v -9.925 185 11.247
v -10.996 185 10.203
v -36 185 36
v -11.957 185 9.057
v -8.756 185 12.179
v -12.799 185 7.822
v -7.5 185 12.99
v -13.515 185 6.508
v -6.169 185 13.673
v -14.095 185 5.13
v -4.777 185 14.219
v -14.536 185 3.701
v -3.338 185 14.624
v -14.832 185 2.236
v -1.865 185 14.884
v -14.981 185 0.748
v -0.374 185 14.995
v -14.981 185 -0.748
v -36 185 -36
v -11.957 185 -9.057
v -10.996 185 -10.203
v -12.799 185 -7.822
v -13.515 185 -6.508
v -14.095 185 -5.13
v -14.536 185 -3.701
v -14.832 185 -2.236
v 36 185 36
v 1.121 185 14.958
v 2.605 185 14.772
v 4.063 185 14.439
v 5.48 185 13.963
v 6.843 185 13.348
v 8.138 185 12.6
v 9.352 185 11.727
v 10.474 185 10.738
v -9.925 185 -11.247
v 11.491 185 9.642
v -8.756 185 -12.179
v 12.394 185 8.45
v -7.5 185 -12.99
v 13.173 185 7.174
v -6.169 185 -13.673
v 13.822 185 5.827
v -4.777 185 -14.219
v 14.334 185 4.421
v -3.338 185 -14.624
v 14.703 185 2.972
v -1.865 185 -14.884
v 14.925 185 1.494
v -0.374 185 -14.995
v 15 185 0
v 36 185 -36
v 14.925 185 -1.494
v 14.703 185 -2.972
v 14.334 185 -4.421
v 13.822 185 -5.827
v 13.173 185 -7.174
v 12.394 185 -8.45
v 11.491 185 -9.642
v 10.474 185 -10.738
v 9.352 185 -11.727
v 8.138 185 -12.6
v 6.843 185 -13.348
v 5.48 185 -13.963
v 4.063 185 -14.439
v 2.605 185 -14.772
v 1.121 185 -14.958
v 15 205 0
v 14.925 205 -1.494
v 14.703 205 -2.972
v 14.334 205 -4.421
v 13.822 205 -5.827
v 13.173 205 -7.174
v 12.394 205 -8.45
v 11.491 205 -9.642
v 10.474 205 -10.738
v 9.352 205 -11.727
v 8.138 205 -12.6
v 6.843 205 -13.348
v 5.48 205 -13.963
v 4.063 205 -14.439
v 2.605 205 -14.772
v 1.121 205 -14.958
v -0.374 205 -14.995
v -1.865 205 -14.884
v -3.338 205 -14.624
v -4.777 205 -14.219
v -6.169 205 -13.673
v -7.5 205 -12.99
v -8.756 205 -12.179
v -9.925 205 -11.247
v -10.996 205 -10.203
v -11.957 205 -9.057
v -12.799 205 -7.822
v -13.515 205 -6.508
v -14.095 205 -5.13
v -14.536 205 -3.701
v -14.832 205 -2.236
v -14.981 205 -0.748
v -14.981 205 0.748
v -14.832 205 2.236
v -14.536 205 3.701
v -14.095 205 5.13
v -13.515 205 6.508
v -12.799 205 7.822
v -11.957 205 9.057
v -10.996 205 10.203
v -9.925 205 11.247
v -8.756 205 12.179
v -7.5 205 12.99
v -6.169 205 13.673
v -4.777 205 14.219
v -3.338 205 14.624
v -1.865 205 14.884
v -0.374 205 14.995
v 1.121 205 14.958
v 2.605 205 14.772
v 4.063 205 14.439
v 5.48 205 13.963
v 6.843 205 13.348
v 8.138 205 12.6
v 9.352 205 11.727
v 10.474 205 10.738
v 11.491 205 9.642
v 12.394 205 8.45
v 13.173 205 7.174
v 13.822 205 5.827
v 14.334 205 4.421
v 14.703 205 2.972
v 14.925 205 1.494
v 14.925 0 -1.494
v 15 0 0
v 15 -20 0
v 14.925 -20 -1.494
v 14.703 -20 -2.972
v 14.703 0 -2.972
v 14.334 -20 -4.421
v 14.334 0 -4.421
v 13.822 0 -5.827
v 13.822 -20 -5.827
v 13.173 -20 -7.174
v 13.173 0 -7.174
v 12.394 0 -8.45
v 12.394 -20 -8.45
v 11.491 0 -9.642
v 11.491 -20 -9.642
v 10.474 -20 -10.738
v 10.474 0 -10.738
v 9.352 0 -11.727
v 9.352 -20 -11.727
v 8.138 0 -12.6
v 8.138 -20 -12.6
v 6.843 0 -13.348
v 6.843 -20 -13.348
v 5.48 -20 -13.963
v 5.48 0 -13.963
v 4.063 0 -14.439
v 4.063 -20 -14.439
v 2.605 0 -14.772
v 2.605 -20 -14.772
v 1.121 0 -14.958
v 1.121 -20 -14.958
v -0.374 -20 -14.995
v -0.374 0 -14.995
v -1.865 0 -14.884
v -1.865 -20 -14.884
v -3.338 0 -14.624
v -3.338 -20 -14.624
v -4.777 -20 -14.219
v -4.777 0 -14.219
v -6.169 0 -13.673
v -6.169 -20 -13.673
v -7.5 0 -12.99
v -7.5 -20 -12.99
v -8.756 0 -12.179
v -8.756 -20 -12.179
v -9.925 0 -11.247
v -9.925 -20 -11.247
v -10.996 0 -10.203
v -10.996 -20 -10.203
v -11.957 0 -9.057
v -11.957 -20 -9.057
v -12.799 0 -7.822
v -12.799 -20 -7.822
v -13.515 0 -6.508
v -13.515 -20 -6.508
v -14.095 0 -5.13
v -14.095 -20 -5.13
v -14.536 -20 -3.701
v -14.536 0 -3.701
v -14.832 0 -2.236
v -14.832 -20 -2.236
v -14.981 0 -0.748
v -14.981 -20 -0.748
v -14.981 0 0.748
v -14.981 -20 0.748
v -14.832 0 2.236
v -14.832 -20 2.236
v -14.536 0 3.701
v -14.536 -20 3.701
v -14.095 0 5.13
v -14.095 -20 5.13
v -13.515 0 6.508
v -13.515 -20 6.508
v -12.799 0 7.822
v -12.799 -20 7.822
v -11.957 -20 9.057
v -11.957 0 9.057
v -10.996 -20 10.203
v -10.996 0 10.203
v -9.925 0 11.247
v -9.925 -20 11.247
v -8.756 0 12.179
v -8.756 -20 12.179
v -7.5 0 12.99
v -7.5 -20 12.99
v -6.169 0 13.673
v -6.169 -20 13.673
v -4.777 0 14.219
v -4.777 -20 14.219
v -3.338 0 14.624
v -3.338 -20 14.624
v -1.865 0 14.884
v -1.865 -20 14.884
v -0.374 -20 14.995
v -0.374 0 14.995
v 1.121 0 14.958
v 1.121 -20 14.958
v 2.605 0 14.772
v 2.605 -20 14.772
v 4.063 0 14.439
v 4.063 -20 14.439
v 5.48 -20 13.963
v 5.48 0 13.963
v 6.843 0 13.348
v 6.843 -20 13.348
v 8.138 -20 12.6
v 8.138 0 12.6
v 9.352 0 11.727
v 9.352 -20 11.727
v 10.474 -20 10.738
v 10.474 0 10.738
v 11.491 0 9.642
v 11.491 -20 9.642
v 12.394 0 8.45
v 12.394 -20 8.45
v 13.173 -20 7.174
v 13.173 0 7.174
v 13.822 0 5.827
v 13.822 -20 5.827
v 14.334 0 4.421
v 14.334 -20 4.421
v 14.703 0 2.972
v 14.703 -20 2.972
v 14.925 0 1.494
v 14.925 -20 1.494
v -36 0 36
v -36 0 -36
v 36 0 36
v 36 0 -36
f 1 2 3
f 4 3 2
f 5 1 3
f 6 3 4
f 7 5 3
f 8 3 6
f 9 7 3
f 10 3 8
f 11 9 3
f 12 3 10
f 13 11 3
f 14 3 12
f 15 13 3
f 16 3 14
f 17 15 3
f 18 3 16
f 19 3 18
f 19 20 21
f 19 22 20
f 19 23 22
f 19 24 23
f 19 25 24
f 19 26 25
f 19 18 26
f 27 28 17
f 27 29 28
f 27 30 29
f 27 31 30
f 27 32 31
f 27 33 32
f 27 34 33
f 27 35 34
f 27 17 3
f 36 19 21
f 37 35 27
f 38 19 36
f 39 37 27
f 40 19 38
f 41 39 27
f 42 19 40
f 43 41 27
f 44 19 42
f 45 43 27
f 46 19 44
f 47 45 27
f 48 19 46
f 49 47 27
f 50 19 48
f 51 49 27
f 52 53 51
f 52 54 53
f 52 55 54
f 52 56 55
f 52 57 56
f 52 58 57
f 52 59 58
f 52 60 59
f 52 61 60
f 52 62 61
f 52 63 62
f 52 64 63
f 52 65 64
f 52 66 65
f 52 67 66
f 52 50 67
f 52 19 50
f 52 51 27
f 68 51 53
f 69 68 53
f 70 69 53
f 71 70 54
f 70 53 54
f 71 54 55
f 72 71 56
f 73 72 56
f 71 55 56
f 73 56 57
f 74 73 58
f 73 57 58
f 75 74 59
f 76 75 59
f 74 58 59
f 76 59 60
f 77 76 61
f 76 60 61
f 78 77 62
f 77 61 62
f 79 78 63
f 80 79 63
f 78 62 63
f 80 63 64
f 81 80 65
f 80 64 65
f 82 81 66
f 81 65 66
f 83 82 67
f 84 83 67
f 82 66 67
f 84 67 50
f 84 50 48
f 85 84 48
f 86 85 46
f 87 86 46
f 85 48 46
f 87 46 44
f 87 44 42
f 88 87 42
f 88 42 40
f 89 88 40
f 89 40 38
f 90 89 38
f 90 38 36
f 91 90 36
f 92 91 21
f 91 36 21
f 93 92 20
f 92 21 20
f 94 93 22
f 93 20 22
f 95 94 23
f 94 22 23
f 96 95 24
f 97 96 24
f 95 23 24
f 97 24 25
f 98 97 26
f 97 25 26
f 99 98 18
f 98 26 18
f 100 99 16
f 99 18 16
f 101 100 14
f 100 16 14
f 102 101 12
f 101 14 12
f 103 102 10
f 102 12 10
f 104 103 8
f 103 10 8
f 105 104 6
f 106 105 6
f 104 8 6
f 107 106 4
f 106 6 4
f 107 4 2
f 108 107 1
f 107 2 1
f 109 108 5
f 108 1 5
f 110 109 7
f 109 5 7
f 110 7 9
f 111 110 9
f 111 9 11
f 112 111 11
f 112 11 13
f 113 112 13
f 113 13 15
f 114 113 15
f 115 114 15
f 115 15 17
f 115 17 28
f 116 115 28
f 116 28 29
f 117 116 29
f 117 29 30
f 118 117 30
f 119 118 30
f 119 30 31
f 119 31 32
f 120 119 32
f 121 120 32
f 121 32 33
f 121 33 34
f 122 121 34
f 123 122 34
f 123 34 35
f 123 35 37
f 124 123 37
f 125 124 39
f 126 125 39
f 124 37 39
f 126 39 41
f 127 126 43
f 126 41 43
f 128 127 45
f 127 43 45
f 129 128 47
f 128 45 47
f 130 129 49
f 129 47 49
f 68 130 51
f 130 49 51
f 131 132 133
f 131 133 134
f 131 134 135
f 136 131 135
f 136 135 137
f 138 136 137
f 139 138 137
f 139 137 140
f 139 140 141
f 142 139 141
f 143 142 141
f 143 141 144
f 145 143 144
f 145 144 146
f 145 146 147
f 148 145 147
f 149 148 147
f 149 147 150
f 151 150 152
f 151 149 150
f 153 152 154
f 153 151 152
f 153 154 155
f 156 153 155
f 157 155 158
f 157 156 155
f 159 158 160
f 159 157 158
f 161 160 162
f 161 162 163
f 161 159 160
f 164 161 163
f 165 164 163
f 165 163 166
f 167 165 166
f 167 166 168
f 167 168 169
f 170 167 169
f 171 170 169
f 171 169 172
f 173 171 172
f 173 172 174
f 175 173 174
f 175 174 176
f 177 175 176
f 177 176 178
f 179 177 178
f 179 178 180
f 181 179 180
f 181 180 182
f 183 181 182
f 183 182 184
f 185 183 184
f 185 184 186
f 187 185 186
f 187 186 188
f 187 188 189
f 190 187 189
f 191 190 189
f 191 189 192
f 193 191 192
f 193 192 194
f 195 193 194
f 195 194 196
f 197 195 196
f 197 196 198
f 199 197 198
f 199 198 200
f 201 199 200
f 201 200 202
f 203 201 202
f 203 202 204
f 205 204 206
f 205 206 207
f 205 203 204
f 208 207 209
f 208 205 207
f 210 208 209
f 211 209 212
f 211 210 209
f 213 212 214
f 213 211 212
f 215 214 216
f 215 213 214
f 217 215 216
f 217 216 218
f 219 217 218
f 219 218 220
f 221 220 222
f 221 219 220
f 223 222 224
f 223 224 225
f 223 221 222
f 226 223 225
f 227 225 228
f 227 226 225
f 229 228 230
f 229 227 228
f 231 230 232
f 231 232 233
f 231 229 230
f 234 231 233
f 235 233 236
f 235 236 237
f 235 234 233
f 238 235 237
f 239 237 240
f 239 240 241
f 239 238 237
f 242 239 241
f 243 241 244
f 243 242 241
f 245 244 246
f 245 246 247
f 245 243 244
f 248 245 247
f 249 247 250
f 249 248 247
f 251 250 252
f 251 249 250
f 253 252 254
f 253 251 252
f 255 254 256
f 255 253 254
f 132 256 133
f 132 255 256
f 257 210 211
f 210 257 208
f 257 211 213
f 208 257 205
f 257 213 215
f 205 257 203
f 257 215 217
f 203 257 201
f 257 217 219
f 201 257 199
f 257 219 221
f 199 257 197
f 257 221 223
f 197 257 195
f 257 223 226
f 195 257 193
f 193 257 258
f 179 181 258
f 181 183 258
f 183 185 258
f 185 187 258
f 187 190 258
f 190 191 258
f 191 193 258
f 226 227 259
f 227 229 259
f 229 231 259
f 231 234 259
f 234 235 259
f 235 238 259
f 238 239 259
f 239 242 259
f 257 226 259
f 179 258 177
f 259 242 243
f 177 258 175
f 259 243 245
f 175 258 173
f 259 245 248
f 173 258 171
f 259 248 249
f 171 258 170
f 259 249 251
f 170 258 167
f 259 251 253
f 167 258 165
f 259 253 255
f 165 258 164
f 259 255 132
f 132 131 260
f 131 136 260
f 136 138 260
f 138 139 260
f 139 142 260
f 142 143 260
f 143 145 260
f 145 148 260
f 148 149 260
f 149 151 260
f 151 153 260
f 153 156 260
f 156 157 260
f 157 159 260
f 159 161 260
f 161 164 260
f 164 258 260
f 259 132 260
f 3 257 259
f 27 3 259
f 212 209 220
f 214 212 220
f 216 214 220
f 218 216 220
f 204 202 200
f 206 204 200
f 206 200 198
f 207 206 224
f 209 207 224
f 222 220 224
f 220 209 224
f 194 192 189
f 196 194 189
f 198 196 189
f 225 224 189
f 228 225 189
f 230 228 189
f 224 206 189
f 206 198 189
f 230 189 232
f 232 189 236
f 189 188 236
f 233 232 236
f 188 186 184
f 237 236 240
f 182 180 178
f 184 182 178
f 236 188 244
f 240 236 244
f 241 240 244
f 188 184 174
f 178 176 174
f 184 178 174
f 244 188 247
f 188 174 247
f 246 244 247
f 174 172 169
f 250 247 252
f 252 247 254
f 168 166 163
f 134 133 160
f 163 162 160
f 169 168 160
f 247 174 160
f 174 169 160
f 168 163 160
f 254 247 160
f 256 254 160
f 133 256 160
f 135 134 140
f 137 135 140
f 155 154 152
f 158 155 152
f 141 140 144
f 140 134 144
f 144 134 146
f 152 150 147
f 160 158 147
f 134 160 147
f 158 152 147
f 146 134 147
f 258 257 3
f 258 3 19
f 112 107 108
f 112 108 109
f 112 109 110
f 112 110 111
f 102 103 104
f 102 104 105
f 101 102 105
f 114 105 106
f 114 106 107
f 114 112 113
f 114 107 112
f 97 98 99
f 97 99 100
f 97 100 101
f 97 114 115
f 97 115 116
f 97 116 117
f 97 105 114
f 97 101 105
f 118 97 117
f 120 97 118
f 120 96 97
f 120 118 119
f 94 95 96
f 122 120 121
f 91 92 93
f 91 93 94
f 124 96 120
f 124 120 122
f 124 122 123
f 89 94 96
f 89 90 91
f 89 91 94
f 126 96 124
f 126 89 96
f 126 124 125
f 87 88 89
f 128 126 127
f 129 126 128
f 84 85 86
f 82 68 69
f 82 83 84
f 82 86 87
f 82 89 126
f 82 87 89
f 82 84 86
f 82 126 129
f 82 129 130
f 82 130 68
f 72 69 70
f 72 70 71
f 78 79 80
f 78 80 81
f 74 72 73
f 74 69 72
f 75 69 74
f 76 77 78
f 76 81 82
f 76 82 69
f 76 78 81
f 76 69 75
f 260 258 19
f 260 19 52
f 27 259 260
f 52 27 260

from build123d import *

# Parameters (mm, degrees)
SKETCH1_W                = 72
SKETCH1_H                = 72
BOSS_EXTRUDE1_DEPTH      = 185
SKETCH2_R                = 15
BOSS_EXTRUDE2_DEPTH      = 20
BOSS_EXTRUDE2_DEPTH_BACK = 205


with BuildPart() as part:
    # Sketch1 → Boss-Extrude1 (new body)
    with BuildSketch(Plane(origin=(0, 0, 0), x_dir=(1, 0, 0), z_dir=(0, 1, 0))):
        Rectangle(SKETCH1_W, SKETCH1_H)
    extrude(amount=BOSS_EXTRUDE1_DEPTH)

    # Sketch2 → Boss-Extrude2 (add, two sides)
    with BuildSketch(Plane(origin=(0, 185, 0), x_dir=(1, 0, 0), z_dir=(0, 1, 0))) as boss_extrude2_sk:
        Circle(SKETCH2_R)
    extrude(amount=BOSS_EXTRUDE2_DEPTH)
    extrude(boss_extrude2_sk.sketch, amount=-BOSS_EXTRUDE2_DEPTH_BACK)


solid = part.part
